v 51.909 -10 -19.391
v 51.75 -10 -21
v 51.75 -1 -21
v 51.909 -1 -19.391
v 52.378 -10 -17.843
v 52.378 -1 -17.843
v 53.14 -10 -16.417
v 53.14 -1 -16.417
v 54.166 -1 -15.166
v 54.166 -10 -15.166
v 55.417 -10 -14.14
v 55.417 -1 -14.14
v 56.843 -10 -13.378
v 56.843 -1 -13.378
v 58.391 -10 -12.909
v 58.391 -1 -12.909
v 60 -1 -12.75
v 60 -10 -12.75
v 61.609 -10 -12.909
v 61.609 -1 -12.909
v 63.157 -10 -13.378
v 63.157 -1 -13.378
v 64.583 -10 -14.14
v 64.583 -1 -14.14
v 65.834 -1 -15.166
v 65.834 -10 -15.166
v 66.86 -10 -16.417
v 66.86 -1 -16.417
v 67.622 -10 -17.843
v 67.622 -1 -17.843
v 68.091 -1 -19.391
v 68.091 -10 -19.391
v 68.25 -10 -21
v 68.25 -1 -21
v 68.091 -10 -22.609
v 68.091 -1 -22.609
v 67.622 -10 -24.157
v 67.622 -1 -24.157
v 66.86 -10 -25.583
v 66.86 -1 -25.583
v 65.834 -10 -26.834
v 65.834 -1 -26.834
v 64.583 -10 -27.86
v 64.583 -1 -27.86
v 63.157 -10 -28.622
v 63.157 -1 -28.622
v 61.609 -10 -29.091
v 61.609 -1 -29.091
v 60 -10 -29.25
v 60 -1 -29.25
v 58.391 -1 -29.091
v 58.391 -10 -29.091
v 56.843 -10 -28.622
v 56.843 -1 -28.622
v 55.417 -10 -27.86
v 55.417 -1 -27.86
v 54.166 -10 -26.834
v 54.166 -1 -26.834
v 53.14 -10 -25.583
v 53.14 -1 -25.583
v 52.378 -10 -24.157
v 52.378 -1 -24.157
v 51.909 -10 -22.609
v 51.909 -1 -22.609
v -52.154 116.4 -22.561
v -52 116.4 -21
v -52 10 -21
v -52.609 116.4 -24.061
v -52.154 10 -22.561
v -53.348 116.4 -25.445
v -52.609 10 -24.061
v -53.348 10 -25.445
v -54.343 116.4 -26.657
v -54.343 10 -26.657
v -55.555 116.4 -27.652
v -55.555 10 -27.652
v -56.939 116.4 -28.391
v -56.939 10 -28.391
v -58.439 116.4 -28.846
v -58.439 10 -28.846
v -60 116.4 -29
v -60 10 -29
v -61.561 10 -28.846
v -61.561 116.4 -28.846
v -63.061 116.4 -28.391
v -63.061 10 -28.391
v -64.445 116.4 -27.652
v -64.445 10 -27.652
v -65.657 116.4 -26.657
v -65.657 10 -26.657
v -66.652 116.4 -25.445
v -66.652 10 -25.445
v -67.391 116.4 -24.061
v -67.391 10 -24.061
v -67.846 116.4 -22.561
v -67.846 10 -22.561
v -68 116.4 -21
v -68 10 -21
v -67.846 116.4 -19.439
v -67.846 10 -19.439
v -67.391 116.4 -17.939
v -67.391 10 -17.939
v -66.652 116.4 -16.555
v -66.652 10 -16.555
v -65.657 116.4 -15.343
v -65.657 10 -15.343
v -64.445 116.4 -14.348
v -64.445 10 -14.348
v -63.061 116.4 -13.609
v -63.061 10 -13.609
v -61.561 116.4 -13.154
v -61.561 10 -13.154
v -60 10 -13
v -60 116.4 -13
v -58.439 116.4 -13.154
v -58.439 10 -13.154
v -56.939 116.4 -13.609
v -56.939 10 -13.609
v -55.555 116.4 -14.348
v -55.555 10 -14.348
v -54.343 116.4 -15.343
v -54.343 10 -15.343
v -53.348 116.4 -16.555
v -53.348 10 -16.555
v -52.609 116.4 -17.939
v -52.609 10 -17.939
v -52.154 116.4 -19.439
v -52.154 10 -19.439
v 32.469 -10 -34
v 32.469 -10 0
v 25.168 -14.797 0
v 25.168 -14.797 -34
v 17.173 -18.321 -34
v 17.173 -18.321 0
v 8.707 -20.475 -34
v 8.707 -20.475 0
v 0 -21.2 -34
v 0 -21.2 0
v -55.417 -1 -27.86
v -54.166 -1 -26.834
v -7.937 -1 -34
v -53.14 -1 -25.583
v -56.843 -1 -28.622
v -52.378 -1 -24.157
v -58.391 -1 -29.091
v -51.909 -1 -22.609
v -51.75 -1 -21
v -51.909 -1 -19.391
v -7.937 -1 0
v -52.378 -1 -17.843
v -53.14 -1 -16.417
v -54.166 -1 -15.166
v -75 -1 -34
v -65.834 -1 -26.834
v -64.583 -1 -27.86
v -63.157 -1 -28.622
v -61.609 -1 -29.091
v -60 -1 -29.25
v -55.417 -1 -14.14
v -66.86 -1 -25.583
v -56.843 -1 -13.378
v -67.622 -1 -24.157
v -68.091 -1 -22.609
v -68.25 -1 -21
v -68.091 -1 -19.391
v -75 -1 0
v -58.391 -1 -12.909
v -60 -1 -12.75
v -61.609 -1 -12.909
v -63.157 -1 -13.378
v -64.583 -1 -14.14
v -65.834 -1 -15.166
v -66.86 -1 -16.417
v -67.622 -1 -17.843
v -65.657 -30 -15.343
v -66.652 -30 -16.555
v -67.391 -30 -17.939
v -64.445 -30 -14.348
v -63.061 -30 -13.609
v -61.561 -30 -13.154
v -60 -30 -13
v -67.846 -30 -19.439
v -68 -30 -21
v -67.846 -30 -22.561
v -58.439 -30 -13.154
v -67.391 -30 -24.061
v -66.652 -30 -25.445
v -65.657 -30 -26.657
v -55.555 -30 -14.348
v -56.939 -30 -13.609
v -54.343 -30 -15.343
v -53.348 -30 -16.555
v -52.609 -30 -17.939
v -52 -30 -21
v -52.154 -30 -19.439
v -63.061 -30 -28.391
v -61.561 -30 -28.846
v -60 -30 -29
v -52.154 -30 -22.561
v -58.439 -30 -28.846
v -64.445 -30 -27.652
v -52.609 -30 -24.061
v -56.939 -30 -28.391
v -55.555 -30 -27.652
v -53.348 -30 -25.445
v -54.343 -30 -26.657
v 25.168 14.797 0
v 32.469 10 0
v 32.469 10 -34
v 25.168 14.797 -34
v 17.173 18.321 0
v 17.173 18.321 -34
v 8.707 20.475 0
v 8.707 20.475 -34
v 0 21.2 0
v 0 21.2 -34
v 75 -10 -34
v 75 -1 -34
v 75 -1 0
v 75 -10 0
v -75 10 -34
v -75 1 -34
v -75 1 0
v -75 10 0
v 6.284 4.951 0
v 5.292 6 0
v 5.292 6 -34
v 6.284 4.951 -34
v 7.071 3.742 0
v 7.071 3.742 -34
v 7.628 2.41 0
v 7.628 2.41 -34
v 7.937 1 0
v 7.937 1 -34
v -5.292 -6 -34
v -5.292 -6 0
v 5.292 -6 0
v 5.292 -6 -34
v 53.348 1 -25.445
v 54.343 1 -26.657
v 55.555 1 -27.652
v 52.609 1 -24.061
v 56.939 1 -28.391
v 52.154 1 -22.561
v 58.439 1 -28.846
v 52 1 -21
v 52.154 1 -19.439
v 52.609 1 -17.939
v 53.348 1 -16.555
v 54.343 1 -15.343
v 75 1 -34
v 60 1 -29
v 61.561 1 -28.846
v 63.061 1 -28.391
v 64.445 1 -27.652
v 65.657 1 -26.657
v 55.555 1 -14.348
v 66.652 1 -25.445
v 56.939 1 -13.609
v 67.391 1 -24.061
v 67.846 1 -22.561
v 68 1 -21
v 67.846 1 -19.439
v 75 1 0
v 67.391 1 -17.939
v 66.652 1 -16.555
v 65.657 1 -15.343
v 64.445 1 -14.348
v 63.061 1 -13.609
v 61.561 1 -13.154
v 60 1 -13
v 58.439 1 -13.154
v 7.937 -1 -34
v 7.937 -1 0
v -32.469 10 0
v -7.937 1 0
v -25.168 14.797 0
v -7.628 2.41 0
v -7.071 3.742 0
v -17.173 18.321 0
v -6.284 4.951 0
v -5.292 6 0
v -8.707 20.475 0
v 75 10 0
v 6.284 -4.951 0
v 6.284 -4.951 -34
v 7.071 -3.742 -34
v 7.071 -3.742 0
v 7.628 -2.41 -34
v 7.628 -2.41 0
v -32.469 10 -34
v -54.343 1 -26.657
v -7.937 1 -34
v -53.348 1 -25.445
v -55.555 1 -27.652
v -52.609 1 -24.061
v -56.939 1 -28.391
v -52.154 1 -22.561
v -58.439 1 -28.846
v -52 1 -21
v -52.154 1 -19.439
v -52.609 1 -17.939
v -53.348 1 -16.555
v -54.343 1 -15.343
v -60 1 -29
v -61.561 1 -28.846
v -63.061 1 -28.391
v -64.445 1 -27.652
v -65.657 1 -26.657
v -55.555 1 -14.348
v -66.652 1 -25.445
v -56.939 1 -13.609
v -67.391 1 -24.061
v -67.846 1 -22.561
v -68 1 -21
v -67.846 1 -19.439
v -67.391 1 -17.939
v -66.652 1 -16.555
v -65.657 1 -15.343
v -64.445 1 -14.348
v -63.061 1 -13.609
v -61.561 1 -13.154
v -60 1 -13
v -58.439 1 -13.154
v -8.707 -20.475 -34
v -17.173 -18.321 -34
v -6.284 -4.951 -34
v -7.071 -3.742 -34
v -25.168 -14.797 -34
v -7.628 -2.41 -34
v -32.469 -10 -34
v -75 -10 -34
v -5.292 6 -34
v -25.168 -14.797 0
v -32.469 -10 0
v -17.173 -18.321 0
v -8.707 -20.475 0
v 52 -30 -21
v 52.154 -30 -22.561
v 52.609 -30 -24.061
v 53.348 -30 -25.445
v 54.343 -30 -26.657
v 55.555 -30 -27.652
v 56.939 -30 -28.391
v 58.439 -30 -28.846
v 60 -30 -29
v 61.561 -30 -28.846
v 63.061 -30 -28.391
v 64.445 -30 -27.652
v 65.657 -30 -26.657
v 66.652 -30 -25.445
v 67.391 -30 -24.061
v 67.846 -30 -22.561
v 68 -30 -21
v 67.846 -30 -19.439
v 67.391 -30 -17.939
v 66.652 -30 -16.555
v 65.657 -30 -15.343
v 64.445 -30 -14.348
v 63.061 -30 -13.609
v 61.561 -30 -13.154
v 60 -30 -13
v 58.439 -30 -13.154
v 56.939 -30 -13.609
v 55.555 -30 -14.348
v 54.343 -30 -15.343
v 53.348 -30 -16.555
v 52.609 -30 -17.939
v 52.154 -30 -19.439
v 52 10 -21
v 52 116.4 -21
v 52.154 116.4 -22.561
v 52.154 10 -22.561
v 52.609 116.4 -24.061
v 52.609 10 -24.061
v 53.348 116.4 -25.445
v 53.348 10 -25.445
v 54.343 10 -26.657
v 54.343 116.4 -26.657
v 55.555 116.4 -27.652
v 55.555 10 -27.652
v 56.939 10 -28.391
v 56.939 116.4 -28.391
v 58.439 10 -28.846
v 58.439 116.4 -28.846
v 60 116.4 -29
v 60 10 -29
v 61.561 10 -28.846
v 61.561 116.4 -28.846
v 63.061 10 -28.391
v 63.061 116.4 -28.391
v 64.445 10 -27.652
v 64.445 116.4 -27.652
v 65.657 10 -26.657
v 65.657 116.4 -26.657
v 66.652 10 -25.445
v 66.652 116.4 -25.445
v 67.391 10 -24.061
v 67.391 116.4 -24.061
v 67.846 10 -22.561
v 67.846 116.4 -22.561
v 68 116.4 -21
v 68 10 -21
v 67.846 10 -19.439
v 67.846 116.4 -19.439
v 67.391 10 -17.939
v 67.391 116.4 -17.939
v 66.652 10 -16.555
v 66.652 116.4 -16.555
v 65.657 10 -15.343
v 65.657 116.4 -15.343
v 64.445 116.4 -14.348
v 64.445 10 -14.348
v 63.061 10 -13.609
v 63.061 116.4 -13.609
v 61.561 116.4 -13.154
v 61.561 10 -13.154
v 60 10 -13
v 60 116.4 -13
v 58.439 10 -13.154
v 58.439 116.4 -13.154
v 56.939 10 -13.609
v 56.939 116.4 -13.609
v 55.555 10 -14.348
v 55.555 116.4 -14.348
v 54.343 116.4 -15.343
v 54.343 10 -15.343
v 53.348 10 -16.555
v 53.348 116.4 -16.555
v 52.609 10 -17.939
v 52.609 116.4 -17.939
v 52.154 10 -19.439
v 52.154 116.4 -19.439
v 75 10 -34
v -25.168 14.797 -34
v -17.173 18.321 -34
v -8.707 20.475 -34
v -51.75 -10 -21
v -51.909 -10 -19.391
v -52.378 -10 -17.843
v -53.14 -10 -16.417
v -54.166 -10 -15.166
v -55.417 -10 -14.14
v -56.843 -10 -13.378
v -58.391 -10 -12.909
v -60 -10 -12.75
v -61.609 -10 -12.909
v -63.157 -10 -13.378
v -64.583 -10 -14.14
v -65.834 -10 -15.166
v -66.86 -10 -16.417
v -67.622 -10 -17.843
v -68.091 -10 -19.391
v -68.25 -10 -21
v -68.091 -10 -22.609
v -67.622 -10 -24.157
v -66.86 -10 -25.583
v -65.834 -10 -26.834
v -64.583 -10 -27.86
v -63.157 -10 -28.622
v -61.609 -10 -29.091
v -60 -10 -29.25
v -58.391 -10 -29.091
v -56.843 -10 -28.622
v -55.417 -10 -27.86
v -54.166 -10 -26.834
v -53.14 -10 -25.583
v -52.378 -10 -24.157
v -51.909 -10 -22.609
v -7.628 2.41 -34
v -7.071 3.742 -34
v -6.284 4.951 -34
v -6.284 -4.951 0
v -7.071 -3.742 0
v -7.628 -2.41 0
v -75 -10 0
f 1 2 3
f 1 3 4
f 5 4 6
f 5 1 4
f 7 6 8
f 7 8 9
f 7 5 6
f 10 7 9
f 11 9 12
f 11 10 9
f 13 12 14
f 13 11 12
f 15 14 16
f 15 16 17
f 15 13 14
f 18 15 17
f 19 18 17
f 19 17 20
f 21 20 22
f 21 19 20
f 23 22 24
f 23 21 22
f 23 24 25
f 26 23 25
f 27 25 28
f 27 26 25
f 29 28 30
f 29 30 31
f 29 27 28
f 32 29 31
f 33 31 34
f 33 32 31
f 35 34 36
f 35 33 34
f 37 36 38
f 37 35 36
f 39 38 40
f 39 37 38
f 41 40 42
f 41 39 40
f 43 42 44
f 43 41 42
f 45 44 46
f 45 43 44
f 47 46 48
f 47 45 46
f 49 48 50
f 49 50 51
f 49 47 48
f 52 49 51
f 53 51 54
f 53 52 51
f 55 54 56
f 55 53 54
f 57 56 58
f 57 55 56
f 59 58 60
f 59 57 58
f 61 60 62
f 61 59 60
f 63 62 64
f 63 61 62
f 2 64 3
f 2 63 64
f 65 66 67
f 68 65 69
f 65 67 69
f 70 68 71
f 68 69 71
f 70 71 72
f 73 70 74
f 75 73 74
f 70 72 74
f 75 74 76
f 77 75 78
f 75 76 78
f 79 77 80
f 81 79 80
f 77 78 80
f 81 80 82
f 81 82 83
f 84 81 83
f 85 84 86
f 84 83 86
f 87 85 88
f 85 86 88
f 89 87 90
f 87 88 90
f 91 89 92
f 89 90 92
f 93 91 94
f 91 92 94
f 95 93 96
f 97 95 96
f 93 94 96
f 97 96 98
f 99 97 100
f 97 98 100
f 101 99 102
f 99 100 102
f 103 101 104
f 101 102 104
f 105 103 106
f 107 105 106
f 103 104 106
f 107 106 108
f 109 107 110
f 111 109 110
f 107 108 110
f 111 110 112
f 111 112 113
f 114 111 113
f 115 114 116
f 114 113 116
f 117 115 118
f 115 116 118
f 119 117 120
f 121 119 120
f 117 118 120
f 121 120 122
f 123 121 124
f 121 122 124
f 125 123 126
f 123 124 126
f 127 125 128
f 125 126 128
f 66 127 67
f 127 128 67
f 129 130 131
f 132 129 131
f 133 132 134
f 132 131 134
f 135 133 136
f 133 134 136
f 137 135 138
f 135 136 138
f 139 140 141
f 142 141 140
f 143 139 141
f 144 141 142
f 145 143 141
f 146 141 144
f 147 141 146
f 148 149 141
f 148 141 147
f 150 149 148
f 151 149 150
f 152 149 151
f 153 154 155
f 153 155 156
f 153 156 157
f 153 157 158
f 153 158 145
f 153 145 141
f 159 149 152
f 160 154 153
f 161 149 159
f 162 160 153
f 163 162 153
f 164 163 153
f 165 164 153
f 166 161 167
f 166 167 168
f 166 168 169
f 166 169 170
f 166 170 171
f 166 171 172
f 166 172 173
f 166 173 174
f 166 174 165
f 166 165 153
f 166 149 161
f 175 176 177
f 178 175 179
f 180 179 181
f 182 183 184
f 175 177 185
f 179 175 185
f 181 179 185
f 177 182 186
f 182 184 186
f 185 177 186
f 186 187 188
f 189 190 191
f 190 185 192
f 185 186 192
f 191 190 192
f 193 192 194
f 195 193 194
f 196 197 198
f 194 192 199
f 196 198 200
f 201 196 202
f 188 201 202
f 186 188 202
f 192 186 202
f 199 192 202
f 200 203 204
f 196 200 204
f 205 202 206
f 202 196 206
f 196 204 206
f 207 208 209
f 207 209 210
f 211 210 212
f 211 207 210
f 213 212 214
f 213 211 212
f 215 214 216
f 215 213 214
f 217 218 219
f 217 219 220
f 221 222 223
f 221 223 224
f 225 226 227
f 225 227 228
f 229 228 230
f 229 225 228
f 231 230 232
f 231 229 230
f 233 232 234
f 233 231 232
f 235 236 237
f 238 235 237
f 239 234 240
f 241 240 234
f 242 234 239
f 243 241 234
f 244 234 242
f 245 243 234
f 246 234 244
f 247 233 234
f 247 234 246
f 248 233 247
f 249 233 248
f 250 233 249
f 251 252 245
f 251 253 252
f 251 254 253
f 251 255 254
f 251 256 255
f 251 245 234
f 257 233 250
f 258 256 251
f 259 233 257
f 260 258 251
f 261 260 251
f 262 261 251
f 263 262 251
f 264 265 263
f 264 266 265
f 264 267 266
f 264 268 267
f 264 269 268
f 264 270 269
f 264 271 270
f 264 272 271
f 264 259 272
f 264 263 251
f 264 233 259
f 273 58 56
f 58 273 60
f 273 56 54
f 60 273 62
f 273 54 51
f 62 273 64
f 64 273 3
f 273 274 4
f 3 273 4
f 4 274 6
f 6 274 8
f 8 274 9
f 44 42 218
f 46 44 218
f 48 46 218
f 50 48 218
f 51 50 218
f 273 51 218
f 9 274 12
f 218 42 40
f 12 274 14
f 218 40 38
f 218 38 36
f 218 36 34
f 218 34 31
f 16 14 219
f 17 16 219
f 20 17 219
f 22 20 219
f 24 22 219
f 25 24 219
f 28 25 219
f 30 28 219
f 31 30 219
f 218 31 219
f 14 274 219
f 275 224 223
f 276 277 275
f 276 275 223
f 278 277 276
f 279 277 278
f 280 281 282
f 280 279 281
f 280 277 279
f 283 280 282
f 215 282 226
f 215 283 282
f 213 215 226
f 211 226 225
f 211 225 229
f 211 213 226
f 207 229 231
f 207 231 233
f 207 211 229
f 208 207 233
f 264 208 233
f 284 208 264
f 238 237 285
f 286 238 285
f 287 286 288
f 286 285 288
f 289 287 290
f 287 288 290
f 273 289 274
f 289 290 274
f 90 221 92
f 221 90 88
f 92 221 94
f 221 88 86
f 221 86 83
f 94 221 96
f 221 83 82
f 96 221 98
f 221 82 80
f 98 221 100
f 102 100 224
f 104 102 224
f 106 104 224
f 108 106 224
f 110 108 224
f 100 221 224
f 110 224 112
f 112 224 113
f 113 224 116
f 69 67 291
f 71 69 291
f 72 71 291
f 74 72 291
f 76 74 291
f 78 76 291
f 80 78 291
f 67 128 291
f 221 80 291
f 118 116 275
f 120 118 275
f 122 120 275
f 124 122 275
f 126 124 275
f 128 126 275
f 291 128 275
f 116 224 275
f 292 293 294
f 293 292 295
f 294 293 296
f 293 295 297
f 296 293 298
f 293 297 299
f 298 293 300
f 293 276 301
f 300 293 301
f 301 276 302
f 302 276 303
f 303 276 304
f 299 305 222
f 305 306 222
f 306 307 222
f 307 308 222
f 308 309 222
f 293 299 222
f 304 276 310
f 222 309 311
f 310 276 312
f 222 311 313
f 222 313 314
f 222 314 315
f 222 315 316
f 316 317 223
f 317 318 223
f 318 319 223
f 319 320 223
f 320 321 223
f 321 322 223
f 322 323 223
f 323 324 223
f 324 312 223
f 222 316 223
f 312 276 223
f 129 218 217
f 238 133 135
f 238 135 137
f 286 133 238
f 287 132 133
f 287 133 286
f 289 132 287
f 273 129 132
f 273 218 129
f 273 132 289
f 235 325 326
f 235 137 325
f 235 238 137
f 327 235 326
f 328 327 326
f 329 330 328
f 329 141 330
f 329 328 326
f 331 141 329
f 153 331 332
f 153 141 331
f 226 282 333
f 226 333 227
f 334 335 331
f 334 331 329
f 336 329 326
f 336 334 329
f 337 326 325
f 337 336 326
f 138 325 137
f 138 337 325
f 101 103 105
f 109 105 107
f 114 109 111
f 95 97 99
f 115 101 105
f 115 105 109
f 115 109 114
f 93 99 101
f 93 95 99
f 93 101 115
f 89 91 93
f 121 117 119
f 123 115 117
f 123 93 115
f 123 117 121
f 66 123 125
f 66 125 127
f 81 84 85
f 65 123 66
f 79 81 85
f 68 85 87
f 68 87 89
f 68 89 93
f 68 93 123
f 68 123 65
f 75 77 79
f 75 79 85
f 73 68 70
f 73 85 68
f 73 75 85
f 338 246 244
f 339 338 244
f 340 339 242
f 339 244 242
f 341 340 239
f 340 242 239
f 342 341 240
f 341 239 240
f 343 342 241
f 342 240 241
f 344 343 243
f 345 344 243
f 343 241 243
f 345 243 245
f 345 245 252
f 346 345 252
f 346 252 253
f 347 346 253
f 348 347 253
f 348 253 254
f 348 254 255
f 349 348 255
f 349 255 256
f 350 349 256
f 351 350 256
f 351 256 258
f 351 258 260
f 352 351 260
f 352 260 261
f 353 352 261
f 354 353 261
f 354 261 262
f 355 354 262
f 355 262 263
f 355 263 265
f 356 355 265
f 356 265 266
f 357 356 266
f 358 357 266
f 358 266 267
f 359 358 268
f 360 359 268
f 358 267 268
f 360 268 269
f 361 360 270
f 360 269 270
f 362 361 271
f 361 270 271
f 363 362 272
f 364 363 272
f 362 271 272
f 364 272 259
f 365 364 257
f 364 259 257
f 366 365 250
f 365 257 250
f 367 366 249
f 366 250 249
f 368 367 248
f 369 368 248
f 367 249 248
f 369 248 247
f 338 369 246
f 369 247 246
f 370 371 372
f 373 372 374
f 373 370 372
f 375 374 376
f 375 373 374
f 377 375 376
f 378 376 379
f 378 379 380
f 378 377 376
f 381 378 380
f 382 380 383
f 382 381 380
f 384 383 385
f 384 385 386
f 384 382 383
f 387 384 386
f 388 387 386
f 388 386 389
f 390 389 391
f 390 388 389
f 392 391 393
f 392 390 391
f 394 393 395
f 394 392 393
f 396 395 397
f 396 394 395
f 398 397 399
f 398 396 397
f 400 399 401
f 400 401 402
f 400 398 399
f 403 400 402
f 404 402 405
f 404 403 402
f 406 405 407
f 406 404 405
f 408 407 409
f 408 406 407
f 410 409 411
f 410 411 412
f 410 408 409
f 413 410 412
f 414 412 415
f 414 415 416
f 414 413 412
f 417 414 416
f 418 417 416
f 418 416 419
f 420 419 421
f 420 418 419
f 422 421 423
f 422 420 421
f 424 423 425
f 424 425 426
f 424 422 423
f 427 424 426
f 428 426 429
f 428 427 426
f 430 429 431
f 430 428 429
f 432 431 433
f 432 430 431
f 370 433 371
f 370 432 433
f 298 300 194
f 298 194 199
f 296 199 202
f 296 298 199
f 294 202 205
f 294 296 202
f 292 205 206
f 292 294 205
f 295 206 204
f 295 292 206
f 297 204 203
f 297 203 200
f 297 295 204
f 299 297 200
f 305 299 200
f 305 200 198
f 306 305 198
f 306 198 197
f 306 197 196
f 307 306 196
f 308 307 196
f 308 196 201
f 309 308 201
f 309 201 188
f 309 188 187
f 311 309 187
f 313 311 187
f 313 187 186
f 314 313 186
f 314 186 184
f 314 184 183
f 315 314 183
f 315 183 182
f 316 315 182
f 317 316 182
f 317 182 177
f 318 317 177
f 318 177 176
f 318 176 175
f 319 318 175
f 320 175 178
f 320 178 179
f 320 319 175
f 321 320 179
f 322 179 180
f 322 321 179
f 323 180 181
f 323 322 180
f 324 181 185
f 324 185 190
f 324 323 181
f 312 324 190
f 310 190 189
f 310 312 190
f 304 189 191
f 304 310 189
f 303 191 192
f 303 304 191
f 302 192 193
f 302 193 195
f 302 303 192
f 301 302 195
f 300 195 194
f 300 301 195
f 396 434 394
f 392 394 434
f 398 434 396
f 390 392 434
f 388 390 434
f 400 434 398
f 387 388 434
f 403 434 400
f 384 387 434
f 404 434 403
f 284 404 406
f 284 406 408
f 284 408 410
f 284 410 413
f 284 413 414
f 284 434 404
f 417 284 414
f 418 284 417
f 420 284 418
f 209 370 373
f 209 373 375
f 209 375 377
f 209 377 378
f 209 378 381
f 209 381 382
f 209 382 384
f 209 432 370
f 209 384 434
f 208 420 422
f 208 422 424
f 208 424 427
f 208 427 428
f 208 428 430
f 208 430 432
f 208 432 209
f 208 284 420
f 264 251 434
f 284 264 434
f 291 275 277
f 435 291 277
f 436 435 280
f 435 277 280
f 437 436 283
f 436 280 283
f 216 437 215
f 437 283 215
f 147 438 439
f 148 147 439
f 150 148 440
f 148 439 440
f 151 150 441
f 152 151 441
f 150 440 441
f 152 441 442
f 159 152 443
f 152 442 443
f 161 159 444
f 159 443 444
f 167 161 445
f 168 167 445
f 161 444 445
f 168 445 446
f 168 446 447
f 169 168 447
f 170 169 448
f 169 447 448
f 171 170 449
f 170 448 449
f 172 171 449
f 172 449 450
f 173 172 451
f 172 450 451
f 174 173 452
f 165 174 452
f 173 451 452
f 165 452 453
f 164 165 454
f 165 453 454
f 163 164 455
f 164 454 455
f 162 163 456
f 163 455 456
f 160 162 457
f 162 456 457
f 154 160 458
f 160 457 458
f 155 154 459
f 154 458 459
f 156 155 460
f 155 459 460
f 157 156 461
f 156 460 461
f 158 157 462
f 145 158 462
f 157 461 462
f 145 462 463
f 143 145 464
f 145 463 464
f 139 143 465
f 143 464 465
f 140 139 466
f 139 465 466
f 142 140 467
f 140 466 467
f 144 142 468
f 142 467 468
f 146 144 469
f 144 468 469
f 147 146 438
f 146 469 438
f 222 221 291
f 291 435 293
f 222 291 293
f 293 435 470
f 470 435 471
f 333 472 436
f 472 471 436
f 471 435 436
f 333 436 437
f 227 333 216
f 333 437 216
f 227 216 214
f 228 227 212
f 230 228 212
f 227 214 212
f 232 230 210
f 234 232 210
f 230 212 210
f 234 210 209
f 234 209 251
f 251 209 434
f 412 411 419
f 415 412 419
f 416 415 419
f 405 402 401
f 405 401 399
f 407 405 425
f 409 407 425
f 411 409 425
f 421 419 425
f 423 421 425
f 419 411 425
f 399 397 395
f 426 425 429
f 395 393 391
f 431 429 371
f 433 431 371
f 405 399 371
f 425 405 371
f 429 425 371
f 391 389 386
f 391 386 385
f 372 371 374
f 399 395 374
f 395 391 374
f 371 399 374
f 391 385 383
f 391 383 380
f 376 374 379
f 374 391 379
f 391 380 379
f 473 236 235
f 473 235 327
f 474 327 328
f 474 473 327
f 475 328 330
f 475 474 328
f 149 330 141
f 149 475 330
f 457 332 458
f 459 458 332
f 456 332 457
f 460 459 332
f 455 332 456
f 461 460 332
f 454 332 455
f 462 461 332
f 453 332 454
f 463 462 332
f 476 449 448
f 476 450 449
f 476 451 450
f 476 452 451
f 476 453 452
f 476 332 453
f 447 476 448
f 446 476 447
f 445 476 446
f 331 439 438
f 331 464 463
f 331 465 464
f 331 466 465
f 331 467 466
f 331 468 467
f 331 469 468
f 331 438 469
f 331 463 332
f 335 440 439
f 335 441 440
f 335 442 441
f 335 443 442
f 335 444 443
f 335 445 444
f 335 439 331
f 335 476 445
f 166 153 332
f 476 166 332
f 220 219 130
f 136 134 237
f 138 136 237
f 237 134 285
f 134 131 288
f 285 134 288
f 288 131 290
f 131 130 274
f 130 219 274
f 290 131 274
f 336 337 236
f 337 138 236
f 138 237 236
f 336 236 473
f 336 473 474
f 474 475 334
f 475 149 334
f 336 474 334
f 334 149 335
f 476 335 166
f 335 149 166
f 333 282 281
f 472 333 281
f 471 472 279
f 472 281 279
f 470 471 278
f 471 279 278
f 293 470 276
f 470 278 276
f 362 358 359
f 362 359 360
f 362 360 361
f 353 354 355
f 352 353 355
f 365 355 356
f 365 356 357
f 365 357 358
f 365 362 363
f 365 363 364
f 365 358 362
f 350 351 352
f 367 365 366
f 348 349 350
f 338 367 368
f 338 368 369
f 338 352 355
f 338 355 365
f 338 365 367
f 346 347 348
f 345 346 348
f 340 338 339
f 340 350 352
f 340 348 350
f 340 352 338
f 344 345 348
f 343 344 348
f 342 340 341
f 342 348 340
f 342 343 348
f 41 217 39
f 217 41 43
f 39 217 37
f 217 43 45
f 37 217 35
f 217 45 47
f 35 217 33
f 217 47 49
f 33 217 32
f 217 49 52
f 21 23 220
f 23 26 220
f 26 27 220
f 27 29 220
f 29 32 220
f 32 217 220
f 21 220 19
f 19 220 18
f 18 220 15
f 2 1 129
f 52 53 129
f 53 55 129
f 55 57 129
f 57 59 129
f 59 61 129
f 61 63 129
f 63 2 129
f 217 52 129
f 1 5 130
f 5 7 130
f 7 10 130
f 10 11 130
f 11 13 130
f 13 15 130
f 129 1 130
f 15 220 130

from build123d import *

# Parameters (mm, degrees)
EXTRUDE_1_DEPTH     = 34
EXTRUDE_1_2_DEPTH   = 34
SKETCH_3_R          = 8
EXTRUDE_2_DEPTH     = 106.4
SKETCH_3_2_R        = 8
EXTRUDE_3_DEPTH     = 40
SKETCH_4_R          = 8.25
CUT_EXTRUDE_1_DEPTH = 9


with BuildPart() as part:
    # Эскиз1 → Бобышка-Вытянуть1 (new body)
    with BuildSketch(Plane.XY):
        with BuildLine():
            Line((0, 21.2), (0, 6))
            Line((0, 6), (-5.291502622, 6))
            ThreePointArc((-5.291502622, 6), (-7.071067812, 3.741657387), (-7.937253933, 1))
            Line((-7.937253933, 1), (-75, 1))
            Line((-75, 1), (-75, 10))
            Line((-75, 10), (-32.469488078, 10))
            ThreePointArc((-32.469488078, 10), (-17.17343629, 18.321326505), (0, 21.2))
        make_face()
    extrude(amount=-EXTRUDE_1_DEPTH)

    # Эскиз3 → Бобышка-Вытянуть2 (add)
    with BuildSketch(Plane(origin=(0, 10, 0), x_dir=(1, 0, 0), z_dir=(0, 1, 0))):
        with Locations((-60, 21)):
            Circle(SKETCH_3_R)
    extrude(amount=EXTRUDE_2_DEPTH)

    # Эскиз3<2> → Бобышка-Вытянуть3 (add)
    with BuildSketch(Plane(origin=(0, 10, 0), x_dir=(1, 0, 0), z_dir=(0, 1, 0))):
        with Locations((-60, 21)):
            Circle(SKETCH_3_2_R)
    extrude(amount=-EXTRUDE_3_DEPTH)

    # Зеркальное отражение1: part across plane


with BuildPart() as body_2:
    # Эскиз1 → Extrude 1 2 (new body)
    with BuildSketch(Plane.XY):
        with BuildLine():
            Line((0, -6), (-5.291502622, -6))
            ThreePointArc((-5.291502622, -6), (-7.071067812, -3.741657387), (-7.937253933, -1))
            Line((-7.937253933, -1), (-75, -1))
            Line((-75, -1), (-75, -10))
            Line((-75, -10), (-32.469488078, -10))
            ThreePointArc((-32.469488078, -10), (-17.17343629, -18.321326505), (0, -21.2))
            Line((0, -21.2), (0, -6))
        make_face()
    extrude(amount=-EXTRUDE_1_2_DEPTH)

    # Эскиз4 → Вырез-Вытянуть1 (cut)
    with BuildSketch(Plane.XZ.offset(10)):
        with Locations((-60, -21)):
            Circle(SKETCH_4_R)
    extrude(amount=-CUT_EXTRUDE_1_DEPTH, mode=Mode.SUBTRACT)

    # Mirror 1 2: body 2 across plane


with BuildPart() as part_1:
    add(part.part)
    add(part.part.mirror(Plane(origin=(0, -21.2, -111.672646408), x_dir=(0, 0, 1), z_dir=(1, 0, 0))))


with BuildPart() as body_2_1:
    add(body_2.part)
    add(body_2.part.mirror(Plane(origin=(0, -21.2, -111.672646408), x_dir=(0, 0, 1), z_dir=(1, 0, 0))))


solid = Compound([part_1.part, body_2_1.part])
